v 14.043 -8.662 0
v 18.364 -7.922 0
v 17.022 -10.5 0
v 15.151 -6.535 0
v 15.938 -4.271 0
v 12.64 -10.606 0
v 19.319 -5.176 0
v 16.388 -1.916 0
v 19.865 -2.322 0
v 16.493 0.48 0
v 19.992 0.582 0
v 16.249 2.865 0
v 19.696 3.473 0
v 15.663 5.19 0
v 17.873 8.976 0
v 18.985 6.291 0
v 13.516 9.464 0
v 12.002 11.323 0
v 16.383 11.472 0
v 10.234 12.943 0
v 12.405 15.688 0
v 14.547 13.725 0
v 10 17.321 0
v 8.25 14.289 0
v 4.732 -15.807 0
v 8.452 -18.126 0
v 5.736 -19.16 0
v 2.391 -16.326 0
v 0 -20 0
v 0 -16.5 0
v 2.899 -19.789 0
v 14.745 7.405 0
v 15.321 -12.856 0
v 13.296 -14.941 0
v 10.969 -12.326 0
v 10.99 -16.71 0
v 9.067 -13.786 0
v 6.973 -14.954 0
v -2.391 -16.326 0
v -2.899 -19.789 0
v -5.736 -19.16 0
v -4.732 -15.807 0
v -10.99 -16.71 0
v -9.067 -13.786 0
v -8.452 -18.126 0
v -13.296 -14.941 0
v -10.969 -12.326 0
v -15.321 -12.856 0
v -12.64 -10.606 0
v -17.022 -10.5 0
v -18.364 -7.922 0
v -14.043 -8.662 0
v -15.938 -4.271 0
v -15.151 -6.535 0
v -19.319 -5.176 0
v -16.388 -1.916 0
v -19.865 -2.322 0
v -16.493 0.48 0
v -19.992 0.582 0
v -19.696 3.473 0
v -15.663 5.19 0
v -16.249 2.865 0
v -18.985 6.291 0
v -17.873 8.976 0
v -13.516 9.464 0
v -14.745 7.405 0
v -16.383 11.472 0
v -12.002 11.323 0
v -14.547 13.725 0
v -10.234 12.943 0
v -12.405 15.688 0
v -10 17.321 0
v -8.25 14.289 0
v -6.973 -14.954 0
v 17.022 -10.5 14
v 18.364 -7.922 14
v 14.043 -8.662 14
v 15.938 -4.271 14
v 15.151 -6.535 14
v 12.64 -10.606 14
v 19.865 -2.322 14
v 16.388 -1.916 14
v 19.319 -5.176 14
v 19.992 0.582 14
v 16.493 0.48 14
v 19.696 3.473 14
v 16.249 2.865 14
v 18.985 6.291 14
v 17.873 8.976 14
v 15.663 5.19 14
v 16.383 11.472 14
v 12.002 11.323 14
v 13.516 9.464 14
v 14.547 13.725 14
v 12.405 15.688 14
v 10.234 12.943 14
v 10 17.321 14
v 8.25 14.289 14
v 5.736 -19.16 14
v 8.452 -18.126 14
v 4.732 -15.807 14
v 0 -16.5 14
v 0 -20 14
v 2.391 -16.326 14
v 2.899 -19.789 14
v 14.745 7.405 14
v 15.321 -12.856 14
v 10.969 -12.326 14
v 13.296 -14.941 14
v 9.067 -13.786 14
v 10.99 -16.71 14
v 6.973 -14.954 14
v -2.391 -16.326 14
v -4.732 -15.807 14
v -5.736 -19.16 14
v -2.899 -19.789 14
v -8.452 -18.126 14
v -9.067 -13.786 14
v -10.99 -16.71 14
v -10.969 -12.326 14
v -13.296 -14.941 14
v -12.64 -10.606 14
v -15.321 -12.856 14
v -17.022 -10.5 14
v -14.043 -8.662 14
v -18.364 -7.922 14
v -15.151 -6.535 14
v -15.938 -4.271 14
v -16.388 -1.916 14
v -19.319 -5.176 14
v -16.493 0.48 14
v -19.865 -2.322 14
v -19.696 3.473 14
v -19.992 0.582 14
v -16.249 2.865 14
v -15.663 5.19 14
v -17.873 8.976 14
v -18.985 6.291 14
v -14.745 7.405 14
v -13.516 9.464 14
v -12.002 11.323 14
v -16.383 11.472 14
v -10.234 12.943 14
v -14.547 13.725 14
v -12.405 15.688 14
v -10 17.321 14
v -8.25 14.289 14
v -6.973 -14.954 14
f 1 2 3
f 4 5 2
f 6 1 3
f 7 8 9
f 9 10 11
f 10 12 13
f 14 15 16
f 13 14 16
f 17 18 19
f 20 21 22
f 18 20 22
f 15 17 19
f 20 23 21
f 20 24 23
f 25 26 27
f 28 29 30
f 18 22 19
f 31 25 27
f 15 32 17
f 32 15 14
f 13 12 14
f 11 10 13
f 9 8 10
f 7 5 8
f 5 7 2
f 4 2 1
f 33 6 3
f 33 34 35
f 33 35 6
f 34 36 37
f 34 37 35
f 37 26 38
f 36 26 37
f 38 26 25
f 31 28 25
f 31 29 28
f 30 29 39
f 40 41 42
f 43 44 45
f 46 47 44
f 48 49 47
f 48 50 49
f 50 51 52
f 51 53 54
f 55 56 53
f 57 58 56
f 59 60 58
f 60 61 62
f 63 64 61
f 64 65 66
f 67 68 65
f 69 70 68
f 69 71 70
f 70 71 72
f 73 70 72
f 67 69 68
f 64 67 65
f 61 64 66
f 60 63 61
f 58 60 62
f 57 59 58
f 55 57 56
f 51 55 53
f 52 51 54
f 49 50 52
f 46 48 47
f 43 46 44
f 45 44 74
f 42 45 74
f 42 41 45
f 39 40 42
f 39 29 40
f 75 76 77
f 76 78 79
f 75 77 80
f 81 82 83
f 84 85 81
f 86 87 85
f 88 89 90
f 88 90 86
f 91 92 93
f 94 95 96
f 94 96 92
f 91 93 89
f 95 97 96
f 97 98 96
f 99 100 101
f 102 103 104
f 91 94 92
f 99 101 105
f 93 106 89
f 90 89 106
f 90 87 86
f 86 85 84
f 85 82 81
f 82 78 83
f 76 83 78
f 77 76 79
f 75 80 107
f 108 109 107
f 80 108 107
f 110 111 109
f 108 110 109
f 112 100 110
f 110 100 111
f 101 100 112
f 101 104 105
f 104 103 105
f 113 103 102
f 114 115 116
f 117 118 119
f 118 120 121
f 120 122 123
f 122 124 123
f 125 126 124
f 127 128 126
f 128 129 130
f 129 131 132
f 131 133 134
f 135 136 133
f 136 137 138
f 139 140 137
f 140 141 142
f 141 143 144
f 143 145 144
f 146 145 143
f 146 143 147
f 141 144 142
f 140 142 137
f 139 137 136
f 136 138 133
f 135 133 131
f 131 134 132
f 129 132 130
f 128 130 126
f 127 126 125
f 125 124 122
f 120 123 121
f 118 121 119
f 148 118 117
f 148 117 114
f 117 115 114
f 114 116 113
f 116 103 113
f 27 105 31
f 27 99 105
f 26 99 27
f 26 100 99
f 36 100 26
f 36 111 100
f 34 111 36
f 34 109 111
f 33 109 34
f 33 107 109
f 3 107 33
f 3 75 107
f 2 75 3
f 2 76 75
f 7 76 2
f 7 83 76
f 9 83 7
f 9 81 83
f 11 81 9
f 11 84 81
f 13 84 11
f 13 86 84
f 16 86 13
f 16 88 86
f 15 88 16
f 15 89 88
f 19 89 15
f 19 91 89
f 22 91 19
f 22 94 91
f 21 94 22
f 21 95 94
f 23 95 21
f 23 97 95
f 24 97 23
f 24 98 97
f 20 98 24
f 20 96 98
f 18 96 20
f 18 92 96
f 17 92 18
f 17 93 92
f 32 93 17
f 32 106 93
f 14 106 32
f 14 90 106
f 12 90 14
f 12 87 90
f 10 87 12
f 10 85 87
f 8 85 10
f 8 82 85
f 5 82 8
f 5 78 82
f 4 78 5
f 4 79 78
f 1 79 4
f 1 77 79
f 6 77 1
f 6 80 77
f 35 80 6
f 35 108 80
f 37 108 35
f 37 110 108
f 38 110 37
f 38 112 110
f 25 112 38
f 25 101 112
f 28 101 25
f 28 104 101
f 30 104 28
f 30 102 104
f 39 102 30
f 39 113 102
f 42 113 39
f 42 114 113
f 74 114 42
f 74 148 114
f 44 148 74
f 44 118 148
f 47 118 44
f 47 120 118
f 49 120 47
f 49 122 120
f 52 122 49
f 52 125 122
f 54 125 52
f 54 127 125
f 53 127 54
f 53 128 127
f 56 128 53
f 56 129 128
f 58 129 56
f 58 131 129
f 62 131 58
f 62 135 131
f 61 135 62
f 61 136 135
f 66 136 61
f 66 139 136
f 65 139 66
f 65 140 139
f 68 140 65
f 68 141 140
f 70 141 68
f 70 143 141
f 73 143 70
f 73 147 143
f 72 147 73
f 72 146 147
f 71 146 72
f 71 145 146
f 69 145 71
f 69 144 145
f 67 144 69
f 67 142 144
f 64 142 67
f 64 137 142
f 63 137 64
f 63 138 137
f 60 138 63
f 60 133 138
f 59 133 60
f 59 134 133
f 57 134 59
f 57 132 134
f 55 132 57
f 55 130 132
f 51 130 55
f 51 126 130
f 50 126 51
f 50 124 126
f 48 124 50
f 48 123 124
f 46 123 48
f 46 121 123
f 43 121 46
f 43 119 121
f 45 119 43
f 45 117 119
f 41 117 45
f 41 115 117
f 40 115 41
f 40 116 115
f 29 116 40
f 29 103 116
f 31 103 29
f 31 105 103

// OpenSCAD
$fn = 32;

// ----------------------------------------------------------------------
// Spring clip: 40 mm outside, 3.5 mm band, 60 degree opening
// ----------------------------------------------------------------------

// --- parameters (mm) ---
outer_r = 20;             // clip outside radius
inner_r = 16.5;           // clip bore radius
band = 3.5;               // band thickness
clip_w = 14;              // clip width
opening = 60;             // opening angle

clip_profile = [[-10, 17.321], [-12.405, 15.688], [-14.547, 13.725], [-16.383, 11.472], [-17.873, 8.976], [-18.985, 6.291], [-19.696, 3.473], [-19.992, 0.582], [-19.865, -2.322], [-19.319, -5.176], [-18.364, -7.922], [-17.022, -10.5], [-15.321, -12.856], [-13.296, -14.941], [-10.99, -16.71], [-8.452, -18.126], [-5.736, -19.16], [-2.899, -19.789], [0, -20], [2.899, -19.789], [5.736, -19.16], [8.452, -18.126], [10.99, -16.71], [13.296, -14.941], [15.321, -12.856], [17.022, -10.5], [18.364, -7.922], [19.319, -5.176], [19.865, -2.322], [19.992, 0.582], [19.696, 3.473], [18.985, 6.291], [17.873, 8.976], [16.383, 11.472], [14.547, 13.725], [12.405, 15.688], [10, 17.321], [8.25, 14.289], [10.234, 12.943], [12.002, 11.323], [13.516, 9.464], [14.745, 7.405], [15.663, 5.19], [16.249, 2.865], [16.493, 0.48], [16.388, -1.916], [15.938, -4.271], [15.151, -6.535], [14.043, -8.662], [12.64, -10.606], [10.969, -12.326], [9.067, -13.786], [6.973, -14.954], [4.732, -15.807], [2.391, -16.326], [0, -16.5], [-2.391, -16.326], [-4.732, -15.807], [-6.973, -14.954], [-9.067, -13.786], [-10.969, -12.326], [-12.64, -10.606], [-14.043, -8.662], [-15.151, -6.535], [-15.938, -4.271], [-16.388, -1.916], [-16.493, 0.48], [-16.249, 2.865], [-15.663, 5.19], [-14.745, 7.405], [-13.516, 9.464], [-12.002, 11.323], [-10.234, 12.943], [-8.25, 14.289]];

difference() {
  union() {
    linear_extrude(height = clip_w) polygon(clip_profile);
  }
}
